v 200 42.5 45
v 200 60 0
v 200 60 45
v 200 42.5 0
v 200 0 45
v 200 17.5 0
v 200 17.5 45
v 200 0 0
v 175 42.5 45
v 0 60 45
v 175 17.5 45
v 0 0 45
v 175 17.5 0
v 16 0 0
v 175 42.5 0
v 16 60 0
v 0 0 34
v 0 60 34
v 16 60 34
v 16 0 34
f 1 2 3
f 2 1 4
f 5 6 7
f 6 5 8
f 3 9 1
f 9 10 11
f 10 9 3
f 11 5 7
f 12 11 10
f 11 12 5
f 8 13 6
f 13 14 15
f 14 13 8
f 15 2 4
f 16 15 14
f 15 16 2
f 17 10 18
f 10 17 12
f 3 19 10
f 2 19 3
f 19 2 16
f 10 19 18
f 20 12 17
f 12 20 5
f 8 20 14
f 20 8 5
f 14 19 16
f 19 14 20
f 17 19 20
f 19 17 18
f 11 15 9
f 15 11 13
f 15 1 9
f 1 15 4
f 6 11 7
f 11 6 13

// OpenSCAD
LenX=200;
WidthY=60;
HightZ=45;
ListH=34;
ListD=16;
Buff=5;
DB=Buff*2;
FeetDia=25;
YSpace=(WidthY-FeetDia)/2;

difference()
{
  cube([LenX,WidthY,HightZ]);
  translate([-Buff,-Buff,-Buff]) cube([ListD+Buff,WidthY+DB,ListH+Buff]);
  translate([LenX-FeetDia,YSpace,-Buff]) 
    cube([FeetDia+Buff,FeetDia,HightZ+DB]);
}
